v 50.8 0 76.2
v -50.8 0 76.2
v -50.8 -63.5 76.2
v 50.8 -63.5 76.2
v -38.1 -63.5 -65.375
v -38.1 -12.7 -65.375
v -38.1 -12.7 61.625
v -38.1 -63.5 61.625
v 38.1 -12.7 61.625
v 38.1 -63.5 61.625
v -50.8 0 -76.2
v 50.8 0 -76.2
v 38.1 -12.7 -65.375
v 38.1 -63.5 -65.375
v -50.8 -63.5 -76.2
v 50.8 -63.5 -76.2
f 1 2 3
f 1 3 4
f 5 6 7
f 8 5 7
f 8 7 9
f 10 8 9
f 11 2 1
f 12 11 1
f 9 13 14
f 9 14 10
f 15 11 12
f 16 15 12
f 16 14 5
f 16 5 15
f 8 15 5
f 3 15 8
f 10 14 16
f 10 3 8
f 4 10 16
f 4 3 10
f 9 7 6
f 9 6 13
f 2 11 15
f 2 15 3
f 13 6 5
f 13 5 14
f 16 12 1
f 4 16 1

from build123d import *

# Parameters (mm, degrees)
F0_W     = 101.6
F0_H     = 152.4
F0_W_2   = 76.2
F0_H_2   = 127
F1_DEPTH = 63.5
F2_DEPTH = 12.7


with BuildPart() as f1:
    # F0 (on Front) → F1 (new body)
    with BuildSketch(Plane.XZ):
        Rectangle(F0_W, F0_H)
        with Locations((0, -1.875399)):
            Rectangle(F0_W_2, F0_H_2, mode=Mode.SUBTRACT)
    extrude(amount=F1_DEPTH)

    # F0 (on Front) → F2 (join)
    with BuildSketch(Plane.XZ):
        with Locations((0, -1.875399)):
            Rectangle(F0_W_2, F0_H_2)
    extrude(amount=F2_DEPTH)


solid = f1.part
